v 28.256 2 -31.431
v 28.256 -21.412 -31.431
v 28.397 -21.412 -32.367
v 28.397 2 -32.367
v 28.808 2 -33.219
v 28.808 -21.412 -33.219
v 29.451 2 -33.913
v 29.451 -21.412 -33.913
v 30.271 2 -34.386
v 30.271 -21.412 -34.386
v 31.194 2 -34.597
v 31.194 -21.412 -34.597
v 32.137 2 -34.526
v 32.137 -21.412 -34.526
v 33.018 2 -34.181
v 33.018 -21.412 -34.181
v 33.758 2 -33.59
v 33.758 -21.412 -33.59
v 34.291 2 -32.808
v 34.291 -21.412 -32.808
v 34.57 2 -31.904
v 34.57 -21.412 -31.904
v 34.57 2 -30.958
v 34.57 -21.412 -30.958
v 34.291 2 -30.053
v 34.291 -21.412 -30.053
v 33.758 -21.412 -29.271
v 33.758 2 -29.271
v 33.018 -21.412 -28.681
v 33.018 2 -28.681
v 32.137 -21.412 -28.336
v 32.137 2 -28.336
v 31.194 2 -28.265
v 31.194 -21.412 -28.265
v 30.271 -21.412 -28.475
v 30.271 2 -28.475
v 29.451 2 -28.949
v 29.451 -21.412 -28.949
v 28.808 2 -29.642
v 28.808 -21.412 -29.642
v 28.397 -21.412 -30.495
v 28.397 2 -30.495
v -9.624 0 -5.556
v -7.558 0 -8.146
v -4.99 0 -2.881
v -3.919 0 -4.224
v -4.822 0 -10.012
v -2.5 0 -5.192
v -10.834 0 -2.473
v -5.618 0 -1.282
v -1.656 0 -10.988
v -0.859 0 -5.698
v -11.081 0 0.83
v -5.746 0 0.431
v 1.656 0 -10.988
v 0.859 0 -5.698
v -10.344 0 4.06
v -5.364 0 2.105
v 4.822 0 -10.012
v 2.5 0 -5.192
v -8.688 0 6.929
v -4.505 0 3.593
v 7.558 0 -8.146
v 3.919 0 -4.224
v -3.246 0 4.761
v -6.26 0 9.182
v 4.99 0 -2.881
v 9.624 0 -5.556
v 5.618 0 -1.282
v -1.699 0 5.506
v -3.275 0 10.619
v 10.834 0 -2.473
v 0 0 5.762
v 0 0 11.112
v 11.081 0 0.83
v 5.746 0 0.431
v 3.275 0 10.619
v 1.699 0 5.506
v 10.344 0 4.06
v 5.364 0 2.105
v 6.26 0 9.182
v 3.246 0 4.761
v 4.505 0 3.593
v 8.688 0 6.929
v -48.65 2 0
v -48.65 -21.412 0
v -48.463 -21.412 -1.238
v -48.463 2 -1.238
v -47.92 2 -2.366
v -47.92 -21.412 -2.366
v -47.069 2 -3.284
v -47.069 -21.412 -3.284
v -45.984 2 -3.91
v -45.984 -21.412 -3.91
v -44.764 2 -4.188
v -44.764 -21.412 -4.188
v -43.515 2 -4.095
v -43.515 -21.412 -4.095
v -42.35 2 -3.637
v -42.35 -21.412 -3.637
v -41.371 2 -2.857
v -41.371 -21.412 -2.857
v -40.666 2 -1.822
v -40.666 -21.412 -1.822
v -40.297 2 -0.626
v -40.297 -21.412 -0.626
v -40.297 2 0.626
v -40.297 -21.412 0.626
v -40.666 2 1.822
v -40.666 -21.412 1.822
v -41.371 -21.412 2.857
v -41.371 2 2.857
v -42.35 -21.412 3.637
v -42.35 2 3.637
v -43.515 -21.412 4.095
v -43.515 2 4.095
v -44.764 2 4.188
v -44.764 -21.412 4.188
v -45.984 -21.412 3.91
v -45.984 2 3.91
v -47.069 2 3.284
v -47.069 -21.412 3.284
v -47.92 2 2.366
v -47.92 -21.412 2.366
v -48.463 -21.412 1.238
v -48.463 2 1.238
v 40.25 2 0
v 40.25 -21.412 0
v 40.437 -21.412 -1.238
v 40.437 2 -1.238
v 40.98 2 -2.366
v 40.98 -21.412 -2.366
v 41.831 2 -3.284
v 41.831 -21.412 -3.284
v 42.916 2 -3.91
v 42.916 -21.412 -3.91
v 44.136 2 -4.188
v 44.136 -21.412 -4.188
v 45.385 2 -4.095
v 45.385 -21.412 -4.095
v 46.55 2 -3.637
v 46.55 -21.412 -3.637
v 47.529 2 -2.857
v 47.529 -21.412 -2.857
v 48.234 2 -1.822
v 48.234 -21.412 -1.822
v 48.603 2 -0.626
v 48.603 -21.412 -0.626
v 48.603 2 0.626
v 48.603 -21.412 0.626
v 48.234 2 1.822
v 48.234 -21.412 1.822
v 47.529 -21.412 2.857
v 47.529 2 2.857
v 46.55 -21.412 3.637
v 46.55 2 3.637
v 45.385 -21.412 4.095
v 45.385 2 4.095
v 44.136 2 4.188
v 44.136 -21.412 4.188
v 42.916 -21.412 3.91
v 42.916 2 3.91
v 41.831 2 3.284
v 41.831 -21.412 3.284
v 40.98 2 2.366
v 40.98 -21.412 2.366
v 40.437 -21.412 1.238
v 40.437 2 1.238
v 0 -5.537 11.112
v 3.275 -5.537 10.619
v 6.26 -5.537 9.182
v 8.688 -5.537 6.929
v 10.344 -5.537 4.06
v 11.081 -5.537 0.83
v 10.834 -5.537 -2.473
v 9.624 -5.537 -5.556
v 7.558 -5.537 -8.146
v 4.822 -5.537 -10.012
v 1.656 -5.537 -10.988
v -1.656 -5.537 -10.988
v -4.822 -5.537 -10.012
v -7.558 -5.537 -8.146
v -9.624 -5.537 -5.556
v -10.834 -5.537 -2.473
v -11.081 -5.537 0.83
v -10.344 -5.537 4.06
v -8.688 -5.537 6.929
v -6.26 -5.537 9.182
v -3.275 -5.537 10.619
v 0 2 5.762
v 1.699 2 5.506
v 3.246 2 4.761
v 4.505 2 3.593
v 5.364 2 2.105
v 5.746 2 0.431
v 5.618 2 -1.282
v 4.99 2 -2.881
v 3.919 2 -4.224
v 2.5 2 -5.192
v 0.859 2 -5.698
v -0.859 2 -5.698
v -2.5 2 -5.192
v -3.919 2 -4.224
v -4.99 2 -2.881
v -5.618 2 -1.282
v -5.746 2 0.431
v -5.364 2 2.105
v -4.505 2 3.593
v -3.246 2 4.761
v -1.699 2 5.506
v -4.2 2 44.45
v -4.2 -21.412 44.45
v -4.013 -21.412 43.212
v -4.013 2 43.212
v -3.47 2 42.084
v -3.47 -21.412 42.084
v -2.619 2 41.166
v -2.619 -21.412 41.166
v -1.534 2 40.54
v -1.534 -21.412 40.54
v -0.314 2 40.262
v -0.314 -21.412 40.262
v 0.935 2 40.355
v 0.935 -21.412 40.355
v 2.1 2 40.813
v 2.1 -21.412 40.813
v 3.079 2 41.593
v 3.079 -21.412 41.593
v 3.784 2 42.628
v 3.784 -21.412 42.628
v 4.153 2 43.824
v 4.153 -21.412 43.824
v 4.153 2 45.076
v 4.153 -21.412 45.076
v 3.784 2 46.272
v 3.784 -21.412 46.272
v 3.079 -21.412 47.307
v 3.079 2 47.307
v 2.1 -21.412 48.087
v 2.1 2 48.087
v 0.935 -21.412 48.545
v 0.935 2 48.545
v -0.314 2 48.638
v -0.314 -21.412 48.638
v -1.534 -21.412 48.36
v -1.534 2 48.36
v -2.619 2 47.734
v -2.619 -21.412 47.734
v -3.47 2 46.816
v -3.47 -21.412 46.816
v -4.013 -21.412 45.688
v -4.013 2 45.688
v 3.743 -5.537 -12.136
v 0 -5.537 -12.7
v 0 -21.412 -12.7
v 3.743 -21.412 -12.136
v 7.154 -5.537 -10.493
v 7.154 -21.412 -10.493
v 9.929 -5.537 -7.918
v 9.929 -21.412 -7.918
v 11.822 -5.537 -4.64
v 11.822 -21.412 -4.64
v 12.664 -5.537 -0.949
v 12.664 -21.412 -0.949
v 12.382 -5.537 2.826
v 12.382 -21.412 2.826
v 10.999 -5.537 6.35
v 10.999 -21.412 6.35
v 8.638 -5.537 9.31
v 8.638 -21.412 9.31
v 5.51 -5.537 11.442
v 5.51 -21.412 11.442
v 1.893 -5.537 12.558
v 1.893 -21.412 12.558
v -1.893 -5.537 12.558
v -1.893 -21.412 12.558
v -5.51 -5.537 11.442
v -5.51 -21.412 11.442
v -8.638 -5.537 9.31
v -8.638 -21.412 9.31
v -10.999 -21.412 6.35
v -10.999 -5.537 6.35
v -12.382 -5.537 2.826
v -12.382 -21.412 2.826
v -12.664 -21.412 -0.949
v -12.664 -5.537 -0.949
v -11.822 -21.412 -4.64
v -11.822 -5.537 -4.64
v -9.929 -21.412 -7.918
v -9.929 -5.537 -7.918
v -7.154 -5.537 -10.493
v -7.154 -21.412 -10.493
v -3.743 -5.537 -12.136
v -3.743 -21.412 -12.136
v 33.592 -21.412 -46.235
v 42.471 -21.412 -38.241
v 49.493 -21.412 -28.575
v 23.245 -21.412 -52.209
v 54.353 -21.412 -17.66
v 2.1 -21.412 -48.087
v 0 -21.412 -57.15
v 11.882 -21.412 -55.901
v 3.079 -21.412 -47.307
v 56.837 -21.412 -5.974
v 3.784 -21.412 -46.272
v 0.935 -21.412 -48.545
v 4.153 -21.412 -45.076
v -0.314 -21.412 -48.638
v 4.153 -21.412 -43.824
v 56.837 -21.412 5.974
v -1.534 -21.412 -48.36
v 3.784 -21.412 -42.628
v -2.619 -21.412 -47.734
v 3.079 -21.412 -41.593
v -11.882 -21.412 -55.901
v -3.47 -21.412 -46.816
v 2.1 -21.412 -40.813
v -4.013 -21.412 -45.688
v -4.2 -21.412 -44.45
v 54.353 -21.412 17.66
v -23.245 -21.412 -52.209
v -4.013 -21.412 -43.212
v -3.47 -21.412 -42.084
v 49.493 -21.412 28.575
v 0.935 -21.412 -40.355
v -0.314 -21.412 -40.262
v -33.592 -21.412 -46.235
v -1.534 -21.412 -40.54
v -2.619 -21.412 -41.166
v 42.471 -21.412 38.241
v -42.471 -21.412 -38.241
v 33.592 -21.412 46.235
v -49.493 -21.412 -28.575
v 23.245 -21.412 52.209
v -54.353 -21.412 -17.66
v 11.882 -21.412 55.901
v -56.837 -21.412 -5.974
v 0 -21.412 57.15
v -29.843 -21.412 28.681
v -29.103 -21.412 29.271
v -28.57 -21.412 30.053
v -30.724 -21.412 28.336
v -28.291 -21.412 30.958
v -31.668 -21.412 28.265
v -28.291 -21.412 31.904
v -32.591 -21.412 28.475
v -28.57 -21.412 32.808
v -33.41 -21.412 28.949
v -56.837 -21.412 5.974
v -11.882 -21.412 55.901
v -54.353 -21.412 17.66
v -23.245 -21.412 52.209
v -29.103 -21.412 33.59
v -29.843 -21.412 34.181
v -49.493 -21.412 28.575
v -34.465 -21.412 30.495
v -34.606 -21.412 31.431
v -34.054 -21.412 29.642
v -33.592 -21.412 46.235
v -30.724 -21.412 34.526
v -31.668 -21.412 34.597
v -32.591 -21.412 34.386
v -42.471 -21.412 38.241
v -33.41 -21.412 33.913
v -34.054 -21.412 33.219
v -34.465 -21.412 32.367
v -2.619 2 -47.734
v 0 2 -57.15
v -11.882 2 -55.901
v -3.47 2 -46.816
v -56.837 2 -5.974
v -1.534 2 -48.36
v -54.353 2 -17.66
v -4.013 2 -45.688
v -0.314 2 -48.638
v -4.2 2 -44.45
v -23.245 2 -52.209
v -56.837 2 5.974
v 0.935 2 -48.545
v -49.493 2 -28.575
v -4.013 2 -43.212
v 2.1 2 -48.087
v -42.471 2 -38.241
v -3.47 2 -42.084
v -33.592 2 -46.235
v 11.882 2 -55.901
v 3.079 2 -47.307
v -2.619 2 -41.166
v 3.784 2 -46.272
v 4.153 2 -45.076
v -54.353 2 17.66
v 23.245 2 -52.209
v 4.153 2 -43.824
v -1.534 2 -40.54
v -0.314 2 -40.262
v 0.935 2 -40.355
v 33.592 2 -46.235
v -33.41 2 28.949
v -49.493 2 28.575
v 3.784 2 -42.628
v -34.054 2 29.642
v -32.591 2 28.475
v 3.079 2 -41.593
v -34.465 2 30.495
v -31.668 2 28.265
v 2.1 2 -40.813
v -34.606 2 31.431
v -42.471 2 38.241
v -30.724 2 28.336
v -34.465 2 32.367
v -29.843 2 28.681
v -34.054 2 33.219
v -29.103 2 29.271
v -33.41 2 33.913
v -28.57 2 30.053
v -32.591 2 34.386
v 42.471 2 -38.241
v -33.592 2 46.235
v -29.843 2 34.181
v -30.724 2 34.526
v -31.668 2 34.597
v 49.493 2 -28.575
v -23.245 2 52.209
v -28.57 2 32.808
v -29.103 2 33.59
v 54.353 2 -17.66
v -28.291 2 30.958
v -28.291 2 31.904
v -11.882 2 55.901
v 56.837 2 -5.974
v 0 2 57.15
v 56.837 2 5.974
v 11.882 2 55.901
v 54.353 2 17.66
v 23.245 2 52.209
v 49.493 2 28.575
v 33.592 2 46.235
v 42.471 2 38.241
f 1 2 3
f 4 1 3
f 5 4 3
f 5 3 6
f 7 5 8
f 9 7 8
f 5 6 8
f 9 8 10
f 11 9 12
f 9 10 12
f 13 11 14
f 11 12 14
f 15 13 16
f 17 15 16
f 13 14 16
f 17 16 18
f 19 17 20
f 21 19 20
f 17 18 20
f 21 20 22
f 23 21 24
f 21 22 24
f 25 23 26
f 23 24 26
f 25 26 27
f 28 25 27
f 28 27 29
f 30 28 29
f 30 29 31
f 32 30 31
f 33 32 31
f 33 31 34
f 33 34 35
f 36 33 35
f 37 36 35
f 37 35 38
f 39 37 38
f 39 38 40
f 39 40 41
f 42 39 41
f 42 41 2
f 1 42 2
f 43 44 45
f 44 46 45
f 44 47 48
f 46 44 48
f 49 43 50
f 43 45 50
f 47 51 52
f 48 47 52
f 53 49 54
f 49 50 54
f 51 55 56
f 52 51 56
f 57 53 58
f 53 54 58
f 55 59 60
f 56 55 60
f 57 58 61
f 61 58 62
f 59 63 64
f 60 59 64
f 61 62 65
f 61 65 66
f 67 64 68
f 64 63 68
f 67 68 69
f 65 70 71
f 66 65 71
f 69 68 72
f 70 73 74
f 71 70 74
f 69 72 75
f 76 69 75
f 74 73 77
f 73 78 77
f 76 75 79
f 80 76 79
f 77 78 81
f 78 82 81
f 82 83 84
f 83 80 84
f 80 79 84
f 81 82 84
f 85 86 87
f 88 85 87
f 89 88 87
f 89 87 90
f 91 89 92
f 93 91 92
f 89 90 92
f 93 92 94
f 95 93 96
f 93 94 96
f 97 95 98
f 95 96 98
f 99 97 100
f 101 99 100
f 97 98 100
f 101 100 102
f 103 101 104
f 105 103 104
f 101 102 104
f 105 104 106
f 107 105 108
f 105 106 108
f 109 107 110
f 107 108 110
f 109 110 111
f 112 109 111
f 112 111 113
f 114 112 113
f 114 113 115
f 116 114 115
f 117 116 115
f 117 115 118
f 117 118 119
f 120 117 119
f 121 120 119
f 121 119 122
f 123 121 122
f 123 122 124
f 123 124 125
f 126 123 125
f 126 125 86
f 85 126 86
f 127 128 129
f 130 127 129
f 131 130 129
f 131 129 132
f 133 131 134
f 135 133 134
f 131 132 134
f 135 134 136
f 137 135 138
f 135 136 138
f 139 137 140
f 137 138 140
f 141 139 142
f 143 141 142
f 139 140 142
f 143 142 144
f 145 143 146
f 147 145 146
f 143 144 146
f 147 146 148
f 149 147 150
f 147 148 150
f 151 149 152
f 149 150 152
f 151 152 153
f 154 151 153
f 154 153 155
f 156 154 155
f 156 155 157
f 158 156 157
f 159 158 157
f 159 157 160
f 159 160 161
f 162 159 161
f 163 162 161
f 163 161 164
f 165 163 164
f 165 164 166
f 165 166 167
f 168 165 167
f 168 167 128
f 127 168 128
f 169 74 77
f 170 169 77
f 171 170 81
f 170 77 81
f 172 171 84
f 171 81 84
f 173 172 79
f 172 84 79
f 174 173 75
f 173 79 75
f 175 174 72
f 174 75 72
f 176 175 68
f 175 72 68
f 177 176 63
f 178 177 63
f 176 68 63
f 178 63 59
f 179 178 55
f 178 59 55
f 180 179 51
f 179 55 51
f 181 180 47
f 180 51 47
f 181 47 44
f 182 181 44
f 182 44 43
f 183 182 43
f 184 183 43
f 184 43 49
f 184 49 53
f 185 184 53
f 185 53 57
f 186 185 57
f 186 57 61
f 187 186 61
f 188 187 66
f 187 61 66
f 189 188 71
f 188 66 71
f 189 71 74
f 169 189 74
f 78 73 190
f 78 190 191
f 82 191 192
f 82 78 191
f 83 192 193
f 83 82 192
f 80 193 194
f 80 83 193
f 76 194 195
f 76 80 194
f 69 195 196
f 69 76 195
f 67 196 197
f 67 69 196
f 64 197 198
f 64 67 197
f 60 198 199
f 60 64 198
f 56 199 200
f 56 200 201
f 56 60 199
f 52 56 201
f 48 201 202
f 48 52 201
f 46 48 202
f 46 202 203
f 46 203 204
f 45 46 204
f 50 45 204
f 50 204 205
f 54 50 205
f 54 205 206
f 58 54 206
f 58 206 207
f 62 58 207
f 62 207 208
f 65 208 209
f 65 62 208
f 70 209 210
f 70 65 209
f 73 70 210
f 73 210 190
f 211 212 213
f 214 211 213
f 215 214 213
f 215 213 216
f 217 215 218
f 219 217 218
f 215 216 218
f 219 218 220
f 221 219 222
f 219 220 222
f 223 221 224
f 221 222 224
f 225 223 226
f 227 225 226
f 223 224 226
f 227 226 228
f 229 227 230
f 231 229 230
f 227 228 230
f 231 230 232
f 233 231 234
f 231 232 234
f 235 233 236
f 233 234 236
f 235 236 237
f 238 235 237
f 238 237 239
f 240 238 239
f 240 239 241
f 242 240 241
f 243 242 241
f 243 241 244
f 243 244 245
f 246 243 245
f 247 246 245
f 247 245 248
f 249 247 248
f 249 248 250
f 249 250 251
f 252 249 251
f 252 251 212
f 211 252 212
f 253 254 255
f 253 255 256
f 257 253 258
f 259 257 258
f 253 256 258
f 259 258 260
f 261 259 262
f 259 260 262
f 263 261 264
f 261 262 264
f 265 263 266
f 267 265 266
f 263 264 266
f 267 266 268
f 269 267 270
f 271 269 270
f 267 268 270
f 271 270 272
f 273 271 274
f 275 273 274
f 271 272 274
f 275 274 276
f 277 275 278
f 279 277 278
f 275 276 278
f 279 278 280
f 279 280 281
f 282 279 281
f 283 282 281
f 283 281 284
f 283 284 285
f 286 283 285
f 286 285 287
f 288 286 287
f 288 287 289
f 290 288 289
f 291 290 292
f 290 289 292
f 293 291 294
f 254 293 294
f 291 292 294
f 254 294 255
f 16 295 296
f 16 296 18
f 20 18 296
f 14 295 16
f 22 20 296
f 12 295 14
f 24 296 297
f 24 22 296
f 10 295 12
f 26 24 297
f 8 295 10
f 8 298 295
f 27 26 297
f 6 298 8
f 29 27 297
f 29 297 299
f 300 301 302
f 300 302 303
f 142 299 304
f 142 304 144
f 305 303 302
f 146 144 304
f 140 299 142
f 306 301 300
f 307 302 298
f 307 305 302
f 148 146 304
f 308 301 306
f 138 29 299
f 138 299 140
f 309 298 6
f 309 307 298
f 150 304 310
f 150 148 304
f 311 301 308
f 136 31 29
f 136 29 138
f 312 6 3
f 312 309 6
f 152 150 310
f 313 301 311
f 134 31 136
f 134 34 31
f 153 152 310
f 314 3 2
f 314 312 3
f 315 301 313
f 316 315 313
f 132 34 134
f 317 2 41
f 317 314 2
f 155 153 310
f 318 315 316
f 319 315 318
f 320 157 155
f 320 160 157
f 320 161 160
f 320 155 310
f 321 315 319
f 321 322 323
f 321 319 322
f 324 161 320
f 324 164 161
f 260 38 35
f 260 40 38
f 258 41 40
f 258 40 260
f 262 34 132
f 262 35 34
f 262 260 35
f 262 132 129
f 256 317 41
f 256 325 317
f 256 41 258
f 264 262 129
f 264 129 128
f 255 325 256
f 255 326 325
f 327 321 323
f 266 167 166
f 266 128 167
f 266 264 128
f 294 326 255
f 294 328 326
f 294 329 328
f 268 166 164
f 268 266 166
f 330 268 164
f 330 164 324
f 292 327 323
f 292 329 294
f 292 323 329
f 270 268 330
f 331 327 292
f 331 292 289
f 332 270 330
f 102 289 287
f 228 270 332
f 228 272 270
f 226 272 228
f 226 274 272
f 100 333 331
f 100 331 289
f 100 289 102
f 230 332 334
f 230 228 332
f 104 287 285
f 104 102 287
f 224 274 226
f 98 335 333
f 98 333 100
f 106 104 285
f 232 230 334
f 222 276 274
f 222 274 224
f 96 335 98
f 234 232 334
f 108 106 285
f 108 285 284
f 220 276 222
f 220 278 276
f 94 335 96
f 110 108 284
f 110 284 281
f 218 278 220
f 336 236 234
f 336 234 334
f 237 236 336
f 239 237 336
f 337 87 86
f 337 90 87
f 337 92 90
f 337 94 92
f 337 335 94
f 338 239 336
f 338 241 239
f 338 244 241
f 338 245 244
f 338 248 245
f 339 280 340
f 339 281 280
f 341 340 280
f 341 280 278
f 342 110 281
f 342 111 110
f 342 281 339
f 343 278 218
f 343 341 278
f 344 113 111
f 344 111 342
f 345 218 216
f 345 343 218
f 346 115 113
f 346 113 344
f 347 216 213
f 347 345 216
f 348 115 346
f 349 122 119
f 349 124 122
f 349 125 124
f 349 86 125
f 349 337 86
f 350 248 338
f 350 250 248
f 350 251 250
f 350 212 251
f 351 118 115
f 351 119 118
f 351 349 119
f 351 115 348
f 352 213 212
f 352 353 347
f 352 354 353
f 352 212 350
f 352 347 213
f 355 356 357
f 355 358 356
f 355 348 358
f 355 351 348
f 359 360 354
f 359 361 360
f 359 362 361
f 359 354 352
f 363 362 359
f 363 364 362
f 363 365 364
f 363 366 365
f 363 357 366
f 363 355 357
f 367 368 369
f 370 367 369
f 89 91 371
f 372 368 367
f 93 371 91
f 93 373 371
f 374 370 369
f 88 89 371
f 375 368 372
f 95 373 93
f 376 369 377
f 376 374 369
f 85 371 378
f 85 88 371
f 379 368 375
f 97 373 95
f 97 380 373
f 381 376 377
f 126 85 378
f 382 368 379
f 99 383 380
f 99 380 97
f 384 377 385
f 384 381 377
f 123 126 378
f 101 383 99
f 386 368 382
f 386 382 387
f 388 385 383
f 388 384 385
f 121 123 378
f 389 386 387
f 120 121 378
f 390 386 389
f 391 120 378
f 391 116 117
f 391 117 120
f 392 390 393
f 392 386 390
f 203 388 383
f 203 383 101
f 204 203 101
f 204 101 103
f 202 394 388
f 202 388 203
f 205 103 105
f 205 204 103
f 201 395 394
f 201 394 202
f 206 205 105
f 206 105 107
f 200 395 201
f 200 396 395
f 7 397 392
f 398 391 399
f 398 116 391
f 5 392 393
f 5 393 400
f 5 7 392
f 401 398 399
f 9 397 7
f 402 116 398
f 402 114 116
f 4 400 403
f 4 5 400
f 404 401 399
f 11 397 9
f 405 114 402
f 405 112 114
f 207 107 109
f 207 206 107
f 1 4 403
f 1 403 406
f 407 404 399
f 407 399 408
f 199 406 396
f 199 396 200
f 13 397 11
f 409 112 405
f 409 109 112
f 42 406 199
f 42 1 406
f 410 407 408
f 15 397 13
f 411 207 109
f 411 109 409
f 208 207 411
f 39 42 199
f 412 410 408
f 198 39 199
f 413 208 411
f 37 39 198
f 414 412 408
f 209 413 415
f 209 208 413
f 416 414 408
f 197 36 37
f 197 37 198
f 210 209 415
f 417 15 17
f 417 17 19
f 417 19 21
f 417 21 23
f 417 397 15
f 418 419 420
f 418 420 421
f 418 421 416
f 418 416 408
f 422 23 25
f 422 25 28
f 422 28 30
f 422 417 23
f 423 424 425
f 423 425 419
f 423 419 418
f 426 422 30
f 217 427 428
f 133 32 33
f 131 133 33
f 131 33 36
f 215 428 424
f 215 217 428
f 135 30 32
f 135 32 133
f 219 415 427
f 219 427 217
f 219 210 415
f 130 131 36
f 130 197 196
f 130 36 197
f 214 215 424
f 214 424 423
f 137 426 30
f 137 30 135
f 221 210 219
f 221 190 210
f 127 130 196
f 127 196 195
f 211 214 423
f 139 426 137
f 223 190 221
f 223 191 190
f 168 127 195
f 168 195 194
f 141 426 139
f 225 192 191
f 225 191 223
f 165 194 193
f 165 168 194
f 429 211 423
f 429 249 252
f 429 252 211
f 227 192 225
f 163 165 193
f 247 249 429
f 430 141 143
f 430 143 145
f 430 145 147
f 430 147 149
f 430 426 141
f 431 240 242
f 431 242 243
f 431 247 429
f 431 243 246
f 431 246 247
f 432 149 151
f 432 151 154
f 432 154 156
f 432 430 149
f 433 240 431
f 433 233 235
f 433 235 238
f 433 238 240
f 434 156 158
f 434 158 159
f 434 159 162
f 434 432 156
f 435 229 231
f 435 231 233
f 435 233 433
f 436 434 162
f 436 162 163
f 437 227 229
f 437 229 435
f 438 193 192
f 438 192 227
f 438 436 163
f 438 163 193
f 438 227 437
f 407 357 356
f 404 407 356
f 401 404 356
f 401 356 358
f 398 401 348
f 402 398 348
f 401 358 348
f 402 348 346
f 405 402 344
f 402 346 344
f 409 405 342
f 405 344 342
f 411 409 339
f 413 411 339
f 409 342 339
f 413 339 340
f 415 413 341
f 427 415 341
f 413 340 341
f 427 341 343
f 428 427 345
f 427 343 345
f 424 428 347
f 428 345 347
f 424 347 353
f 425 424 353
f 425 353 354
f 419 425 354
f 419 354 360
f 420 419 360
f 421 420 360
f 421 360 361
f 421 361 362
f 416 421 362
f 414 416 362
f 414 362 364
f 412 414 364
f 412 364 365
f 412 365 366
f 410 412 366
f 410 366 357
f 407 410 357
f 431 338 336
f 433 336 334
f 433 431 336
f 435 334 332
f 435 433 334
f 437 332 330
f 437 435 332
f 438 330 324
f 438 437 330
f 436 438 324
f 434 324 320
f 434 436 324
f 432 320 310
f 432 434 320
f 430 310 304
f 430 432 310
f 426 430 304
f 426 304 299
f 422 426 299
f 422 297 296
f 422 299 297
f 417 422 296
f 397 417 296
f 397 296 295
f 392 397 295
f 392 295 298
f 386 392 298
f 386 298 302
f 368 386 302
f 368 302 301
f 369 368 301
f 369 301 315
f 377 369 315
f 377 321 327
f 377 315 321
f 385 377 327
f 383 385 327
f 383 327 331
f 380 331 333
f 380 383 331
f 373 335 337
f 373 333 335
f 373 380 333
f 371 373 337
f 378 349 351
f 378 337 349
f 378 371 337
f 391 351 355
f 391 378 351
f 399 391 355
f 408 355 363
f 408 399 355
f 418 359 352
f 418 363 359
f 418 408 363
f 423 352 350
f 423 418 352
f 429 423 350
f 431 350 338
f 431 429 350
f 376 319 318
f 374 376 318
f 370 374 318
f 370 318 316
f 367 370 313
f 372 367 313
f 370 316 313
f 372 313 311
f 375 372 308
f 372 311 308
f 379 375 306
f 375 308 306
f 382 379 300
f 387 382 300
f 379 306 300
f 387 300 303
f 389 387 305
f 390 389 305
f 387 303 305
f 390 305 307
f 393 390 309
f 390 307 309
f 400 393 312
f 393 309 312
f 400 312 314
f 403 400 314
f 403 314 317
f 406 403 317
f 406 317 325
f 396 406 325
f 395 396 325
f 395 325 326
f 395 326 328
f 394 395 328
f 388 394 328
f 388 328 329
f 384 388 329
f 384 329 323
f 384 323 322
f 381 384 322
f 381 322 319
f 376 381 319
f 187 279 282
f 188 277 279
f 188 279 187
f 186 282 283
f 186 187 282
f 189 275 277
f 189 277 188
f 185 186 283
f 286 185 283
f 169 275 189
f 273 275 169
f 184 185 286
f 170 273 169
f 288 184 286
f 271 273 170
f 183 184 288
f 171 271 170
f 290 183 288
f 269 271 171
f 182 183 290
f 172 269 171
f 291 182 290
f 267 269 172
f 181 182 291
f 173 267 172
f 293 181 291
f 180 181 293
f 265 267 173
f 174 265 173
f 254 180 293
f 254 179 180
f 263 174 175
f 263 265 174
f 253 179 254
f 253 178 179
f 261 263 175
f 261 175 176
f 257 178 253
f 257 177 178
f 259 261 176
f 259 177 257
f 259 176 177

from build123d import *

# Parameters (mm, degrees)
SKETCH1_R                      = 57.15
SEAL_SEAT_HIEGHT_DEPTH         = 5.5372
SKETCH2_R                      = 57.15
SEAL_DIAPHRAM_HIEGHT_DEPTH     = 15.875
SEAL_START                     = 2
SKETCH3_R                      = 57.15
SEAL_SHOULDER_HIEGHT_DEPTH     = 2
SKETCH5_R                      = 11.1125
SEAL_SEAT_FIT_DEPTH            = 5.5372
SKETCH7_R                      = 5.7625
SHAFT_CLEARANCE_DEPTH          = 2
M8_CLEARANCE_HOLE1_D           = 8.4
F_1_4_0_25_PRESS_DOWEL_HOLE1_D = 6.35
SKETCH6_R                      = 12.7
CUT_EXTRUDE1_DEPTH             = 15.875


with BuildPart() as part:
    # Sketch1 → seal seat hieght (new body)
    with BuildSketch(Plane(origin=(0, 0, 0), x_dir=(1, 0, 0), z_dir=(0, 1, 0))):
        with Locations(Location((0, 0, 0), (0, 0, 270))):
            Circle(SKETCH1_R)
    extrude(amount=-SEAL_SEAT_HIEGHT_DEPTH)

    # Sketch2 → seal diaphram hieght (add)
    with BuildSketch(Plane.XZ.offset(5.5372)):
        with Locations(Location((0, 0, 0), (0, 0, 90))):
            Circle(SKETCH2_R)
    extrude(amount=SEAL_DIAPHRAM_HIEGHT_DEPTH)

    # Sketch3 → seal shoulder hieght (add)
    with BuildSketch(Plane(origin=(0, 0, 0), x_dir=(1, 0, 0), z_dir=(0, 1, 0)).offset(SEAL_START)):
        with Locations(Location((0, 0, 0), (0, 0, 270))):
            Circle(SKETCH3_R)
    extrude(amount=-SEAL_SHOULDER_HIEGHT_DEPTH)

    # Sketch5 → seal seat fit (cut)
    with BuildSketch(Plane(origin=(0, 0, 0), x_dir=(1, 0, 0), z_dir=(0, 1, 0))):
        with Locations(Location((0, 0, 0), (0, 0, 270))):
            Circle(SKETCH5_R)
    extrude(amount=-SEAL_SEAT_FIT_DEPTH, mode=Mode.SUBTRACT)

    # Sketch7 → shaft clearance (cut)
    with BuildSketch(Plane(origin=(0, 0, 0), x_dir=(1, 0, 0), z_dir=(0, 1, 0))):
        with Locations(Location((0, 0, 0), (0, 0, 270))):
            Circle(SKETCH7_R)
    extrude(amount=SHAFT_CLEARANCE_DEPTH, mode=Mode.SUBTRACT)

    # M8 Clearance Hole1 (through all)
    with Locations(Plane(origin=(0, 2, 0), x_dir=(1, 0, 0), z_dir=(0, 1, 0))):
        with Locations((-44.45, 0), (0, 44.45), (44.45, 0), (0, -44.45)):
            Hole(M8_CLEARANCE_HOLE1_D / 2)

    # 1/4 (0.25) Press Dowel Hole1 (through all)
    with Locations(Plane(origin=(0, 2, 0), x_dir=(1, 0, 0), z_dir=(0, 1, 0))):
        with Locations((31.430896424, 31.430896424), (-31.430896424, -31.430896424)):
            Hole(F_1_4_0_25_PRESS_DOWEL_HOLE1_D / 2)

    # Sketch6 → Cut-Extrude1 (cut)
    with BuildSketch(Plane(origin=(0, -21.4122, 0), x_dir=(-1, 0, 0), z_dir=(0, -1, 0))):
        with Locations(Location((0, 0, 0), (0, 0, 90))):
            Circle(SKETCH6_R)
    extrude(amount=-CUT_EXTRUDE1_DEPTH, mode=Mode.SUBTRACT)


solid = part.part
